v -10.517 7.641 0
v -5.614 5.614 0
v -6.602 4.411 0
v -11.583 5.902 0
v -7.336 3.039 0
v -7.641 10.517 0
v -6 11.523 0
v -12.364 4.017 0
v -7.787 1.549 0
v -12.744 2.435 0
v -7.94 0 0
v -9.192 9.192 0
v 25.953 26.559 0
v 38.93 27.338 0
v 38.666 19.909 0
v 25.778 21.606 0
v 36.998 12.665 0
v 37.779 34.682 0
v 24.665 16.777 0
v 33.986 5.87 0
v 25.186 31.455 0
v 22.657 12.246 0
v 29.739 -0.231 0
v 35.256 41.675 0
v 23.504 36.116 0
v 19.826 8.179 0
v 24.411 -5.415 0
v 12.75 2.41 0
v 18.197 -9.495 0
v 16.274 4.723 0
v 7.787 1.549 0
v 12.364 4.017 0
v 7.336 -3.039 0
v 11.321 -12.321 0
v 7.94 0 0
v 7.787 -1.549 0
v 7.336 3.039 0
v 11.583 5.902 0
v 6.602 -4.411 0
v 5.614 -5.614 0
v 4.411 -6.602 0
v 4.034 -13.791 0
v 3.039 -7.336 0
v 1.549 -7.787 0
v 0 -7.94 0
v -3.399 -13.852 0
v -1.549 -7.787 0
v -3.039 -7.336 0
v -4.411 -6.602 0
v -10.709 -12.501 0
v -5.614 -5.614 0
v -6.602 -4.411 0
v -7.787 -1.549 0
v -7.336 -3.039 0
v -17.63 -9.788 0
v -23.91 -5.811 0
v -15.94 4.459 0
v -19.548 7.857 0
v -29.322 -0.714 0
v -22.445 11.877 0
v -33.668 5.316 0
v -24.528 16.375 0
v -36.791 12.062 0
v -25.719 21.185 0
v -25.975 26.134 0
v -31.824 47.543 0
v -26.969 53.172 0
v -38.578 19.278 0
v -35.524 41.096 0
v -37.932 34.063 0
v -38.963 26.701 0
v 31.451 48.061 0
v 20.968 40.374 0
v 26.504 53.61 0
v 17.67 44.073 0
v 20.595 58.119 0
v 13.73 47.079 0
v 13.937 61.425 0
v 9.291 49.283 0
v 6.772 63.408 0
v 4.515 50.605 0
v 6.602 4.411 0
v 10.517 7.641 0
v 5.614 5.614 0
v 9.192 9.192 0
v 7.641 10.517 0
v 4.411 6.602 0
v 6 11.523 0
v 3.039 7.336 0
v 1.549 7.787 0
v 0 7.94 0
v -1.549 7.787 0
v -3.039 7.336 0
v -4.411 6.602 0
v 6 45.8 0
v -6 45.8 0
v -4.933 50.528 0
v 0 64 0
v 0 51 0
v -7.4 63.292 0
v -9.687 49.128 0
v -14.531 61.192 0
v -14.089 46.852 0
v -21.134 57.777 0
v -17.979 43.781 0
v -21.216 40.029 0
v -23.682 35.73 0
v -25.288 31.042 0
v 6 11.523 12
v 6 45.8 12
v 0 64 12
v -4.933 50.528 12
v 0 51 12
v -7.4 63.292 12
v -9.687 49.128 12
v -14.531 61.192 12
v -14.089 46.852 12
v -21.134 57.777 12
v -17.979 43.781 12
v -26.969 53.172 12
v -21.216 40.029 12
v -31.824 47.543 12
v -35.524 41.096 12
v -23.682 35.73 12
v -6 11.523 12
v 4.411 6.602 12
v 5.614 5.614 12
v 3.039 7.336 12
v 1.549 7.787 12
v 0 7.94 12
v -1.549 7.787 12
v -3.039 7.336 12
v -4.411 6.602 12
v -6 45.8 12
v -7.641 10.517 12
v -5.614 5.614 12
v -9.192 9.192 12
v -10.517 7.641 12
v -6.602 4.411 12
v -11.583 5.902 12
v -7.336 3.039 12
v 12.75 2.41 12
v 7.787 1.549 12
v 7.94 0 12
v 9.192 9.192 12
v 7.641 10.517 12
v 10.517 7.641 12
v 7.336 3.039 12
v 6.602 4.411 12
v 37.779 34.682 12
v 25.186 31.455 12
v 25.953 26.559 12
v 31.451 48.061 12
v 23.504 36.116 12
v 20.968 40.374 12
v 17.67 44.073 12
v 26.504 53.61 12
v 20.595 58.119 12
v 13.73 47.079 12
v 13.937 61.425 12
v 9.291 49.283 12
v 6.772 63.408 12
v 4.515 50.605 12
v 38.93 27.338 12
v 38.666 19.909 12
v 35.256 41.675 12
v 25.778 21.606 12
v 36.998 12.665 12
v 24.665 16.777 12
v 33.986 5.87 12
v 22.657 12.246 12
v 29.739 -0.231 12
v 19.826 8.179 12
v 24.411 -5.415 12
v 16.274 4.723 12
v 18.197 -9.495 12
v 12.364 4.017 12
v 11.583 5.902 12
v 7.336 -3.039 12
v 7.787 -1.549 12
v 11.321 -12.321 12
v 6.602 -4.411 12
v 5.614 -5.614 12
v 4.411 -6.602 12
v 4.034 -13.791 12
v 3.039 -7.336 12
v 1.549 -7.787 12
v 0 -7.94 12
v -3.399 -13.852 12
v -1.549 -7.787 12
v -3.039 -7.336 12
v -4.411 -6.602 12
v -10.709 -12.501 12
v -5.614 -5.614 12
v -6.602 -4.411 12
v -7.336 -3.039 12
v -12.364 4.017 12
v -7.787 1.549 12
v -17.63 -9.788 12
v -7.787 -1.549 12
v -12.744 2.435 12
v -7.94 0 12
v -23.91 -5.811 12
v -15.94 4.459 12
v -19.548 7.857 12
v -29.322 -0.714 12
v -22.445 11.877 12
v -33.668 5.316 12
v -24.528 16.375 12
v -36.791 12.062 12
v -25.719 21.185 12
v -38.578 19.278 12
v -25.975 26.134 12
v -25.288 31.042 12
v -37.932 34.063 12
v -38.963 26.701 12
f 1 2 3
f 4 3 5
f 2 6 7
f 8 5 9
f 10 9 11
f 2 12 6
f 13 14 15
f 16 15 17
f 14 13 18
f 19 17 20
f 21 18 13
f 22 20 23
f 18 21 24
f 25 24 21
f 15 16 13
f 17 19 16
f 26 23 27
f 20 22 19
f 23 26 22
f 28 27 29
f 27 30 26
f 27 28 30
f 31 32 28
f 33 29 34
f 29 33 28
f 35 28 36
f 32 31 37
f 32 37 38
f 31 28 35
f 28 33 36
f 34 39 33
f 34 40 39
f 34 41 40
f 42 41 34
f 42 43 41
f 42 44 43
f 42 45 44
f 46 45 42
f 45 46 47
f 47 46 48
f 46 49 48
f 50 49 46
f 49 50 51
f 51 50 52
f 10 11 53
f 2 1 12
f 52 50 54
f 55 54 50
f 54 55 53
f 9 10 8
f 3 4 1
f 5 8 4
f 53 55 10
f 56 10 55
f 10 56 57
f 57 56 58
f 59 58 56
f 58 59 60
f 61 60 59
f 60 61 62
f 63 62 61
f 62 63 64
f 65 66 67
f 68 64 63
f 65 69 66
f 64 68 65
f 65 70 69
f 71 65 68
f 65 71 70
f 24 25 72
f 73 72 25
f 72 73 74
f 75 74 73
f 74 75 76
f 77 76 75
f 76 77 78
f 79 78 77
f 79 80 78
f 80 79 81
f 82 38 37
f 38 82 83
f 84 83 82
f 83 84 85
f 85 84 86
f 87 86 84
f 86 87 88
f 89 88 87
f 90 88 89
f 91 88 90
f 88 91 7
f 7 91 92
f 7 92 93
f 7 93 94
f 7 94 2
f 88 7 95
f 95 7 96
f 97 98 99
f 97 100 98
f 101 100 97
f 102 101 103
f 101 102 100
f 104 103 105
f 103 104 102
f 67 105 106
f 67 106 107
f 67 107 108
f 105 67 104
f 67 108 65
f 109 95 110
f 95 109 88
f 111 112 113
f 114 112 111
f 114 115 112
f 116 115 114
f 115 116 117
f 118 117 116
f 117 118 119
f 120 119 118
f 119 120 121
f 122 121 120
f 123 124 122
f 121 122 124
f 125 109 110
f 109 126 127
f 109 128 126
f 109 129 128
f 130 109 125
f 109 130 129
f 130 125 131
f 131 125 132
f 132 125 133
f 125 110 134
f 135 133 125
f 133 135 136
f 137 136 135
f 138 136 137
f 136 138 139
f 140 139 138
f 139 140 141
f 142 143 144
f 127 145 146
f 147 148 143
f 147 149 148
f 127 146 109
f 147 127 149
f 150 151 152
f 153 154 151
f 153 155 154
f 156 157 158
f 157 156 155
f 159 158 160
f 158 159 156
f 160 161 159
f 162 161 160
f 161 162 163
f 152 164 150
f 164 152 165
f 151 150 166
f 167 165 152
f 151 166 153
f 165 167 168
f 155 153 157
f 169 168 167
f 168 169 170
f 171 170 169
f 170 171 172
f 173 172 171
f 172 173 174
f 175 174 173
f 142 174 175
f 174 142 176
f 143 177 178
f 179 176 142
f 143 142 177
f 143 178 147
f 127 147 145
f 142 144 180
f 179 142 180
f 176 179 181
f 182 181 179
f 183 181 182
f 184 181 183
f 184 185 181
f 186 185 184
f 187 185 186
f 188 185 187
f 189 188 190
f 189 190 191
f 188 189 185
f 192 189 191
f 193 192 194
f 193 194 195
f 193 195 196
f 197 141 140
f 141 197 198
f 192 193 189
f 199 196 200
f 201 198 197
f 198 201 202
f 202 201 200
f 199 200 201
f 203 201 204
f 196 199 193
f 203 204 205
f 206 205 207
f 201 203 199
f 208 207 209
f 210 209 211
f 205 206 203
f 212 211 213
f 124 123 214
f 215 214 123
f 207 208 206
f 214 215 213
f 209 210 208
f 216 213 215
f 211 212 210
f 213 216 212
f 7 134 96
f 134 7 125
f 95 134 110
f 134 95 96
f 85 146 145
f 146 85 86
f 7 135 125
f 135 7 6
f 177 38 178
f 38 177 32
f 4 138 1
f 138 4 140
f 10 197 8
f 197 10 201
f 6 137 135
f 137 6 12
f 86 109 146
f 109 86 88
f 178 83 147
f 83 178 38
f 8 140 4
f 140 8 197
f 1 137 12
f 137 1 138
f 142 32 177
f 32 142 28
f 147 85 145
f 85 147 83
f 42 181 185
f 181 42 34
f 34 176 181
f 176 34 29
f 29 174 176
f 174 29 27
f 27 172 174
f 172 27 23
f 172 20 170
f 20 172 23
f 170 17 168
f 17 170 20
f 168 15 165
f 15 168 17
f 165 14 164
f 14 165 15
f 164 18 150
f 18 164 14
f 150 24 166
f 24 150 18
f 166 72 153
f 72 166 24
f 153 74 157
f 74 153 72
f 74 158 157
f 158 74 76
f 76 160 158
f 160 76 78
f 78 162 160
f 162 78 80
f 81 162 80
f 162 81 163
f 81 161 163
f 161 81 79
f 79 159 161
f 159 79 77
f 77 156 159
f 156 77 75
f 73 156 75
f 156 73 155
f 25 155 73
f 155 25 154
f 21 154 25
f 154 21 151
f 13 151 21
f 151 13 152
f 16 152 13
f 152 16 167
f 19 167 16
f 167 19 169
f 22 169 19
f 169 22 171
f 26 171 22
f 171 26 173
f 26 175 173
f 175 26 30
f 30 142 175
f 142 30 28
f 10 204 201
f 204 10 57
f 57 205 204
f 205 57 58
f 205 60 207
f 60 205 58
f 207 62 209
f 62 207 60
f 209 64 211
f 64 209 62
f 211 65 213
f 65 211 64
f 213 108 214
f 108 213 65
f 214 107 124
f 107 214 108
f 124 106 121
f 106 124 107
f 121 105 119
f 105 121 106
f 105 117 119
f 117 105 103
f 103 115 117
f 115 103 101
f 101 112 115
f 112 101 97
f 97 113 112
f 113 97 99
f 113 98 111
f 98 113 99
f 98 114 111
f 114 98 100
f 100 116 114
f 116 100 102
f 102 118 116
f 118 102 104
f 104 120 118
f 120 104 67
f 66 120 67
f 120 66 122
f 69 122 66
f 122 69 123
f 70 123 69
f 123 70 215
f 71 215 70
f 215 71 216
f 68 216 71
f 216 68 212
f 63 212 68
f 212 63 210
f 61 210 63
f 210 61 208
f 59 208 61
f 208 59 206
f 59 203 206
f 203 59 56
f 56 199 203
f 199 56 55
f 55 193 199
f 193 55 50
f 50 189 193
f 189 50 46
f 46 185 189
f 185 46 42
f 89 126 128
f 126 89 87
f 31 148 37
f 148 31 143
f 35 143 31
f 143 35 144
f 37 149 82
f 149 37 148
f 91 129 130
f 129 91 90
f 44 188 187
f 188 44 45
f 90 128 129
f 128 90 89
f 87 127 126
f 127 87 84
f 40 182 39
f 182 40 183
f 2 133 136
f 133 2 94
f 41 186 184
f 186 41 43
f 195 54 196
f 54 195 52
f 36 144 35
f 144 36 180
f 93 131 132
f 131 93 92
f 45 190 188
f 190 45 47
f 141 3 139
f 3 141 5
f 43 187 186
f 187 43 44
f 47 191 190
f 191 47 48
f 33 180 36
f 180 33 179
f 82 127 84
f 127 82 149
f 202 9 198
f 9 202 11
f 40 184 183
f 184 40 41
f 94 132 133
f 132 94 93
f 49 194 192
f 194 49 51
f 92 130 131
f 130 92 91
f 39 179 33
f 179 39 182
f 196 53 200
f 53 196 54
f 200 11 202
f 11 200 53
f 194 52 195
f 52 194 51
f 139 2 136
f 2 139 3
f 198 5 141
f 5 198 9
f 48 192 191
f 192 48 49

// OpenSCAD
$fn = 32;

// ----------------------------------------------------------------------
// Hook: 50 mm shank into a 26 mm curl, 12 mm thick
// ----------------------------------------------------------------------

// --- parameters (mm) ---
shank_len = 50;           // shank length from the boss centre
shank_w = 12;             // shank width
boss_d = 26;              // boss diameter
bore_d = 15.88;           // boss bore
curl_in = 26;             // curl inner radius
curl_out = 39;            // curl outer radius
curl_sweep = 350;         // curl sweep angle
hook_t = 12;              // hook thickness

shank_profile = [[-6, 45.8], [6, 45.8], [6, 11], [-6, 11]];
boss_profile = [[13, 0], [12.84, 2.034], [12.364, 4.017], [11.583, 5.902], [10.517, 7.641], [9.192, 9.192], [7.641, 10.517], [5.902, 11.583], [4.017, 12.364], [2.034, 12.84], [0, 13], [-2.034, 12.84], [-4.017, 12.364], [-5.902, 11.583], [-7.641, 10.517], [-9.192, 9.192], [-10.517, 7.641], [-11.583, 5.902], [-12.364, 4.017], [-12.84, 2.034], [-13, 0], [-12.84, -2.034], [-12.364, -4.017], [-11.583, -5.902], [-10.517, -7.641], [-9.192, -9.192], [-7.641, -10.517], [-5.902, -11.583], [-4.017, -12.364], [-2.034, -12.84], [0, -13], [2.034, -12.84], [4.017, -12.364], [5.902, -11.583], [7.641, -10.517], [9.192, -9.192], [10.517, -7.641], [11.583, -5.902], [12.364, -4.017], [12.84, -2.034]];
curl_profile = [[0, 64], [-7.4, 63.292], [-14.531, 61.192], [-21.134, 57.777], [-26.969, 53.172], [-31.824, 47.543], [-35.524, 41.096], [-37.932, 34.063], [-38.963, 26.701], [-38.578, 19.278], [-36.791, 12.062], [-33.668, 5.316], [-29.322, -0.714], [-23.91, -5.811], [-17.63, -9.788], [-10.709, -12.501], [-3.399, -13.852], [4.034, -13.791], [11.321, -12.321], [18.197, -9.495], [24.411, -5.415], [29.739, -0.231], [33.986, 5.87], [36.998, 12.665], [38.666, 19.909], [38.93, 27.338], [37.779, 34.682], [35.256, 41.675], [31.451, 48.061], [26.504, 53.61], [20.595, 58.119], [13.937, 61.425], [6.772, 63.408], [4.515, 50.605], [9.291, 49.283], [13.73, 47.079], [17.67, 44.073], [20.968, 40.374], [23.504, 36.116], [25.186, 31.455], [25.953, 26.559], [25.778, 21.606], [24.665, 16.777], [22.657, 12.246], [19.826, 8.179], [16.274, 4.723], [12.131, 2.004], [7.547, 0.12], [2.69, -0.861], [-2.266, -0.901], [-7.139, -0.001], [-11.753, 1.808], [-15.94, 4.459], [-19.548, 7.857], [-22.445, 11.877], [-24.528, 16.375], [-25.719, 21.185], [-25.975, 26.134], [-25.288, 31.042], [-23.682, 35.73], [-21.216, 40.029], [-17.979, 43.781], [-14.089, 46.852], [-9.687, 49.128], [-4.933, 50.528], [0, 51]];

difference() {
  union() {
    /* three overlapping outlines: shank, boss and the smooth curl */
    linear_extrude(height = hook_t) polygon(shank_profile);
    linear_extrude(height = hook_t) polygon(boss_profile);
    linear_extrude(height = hook_t) polygon(curl_profile);
  }
  translate([0, 0, -2.5]) cylinder(h = hook_t + 5, d = bore_d);
}
